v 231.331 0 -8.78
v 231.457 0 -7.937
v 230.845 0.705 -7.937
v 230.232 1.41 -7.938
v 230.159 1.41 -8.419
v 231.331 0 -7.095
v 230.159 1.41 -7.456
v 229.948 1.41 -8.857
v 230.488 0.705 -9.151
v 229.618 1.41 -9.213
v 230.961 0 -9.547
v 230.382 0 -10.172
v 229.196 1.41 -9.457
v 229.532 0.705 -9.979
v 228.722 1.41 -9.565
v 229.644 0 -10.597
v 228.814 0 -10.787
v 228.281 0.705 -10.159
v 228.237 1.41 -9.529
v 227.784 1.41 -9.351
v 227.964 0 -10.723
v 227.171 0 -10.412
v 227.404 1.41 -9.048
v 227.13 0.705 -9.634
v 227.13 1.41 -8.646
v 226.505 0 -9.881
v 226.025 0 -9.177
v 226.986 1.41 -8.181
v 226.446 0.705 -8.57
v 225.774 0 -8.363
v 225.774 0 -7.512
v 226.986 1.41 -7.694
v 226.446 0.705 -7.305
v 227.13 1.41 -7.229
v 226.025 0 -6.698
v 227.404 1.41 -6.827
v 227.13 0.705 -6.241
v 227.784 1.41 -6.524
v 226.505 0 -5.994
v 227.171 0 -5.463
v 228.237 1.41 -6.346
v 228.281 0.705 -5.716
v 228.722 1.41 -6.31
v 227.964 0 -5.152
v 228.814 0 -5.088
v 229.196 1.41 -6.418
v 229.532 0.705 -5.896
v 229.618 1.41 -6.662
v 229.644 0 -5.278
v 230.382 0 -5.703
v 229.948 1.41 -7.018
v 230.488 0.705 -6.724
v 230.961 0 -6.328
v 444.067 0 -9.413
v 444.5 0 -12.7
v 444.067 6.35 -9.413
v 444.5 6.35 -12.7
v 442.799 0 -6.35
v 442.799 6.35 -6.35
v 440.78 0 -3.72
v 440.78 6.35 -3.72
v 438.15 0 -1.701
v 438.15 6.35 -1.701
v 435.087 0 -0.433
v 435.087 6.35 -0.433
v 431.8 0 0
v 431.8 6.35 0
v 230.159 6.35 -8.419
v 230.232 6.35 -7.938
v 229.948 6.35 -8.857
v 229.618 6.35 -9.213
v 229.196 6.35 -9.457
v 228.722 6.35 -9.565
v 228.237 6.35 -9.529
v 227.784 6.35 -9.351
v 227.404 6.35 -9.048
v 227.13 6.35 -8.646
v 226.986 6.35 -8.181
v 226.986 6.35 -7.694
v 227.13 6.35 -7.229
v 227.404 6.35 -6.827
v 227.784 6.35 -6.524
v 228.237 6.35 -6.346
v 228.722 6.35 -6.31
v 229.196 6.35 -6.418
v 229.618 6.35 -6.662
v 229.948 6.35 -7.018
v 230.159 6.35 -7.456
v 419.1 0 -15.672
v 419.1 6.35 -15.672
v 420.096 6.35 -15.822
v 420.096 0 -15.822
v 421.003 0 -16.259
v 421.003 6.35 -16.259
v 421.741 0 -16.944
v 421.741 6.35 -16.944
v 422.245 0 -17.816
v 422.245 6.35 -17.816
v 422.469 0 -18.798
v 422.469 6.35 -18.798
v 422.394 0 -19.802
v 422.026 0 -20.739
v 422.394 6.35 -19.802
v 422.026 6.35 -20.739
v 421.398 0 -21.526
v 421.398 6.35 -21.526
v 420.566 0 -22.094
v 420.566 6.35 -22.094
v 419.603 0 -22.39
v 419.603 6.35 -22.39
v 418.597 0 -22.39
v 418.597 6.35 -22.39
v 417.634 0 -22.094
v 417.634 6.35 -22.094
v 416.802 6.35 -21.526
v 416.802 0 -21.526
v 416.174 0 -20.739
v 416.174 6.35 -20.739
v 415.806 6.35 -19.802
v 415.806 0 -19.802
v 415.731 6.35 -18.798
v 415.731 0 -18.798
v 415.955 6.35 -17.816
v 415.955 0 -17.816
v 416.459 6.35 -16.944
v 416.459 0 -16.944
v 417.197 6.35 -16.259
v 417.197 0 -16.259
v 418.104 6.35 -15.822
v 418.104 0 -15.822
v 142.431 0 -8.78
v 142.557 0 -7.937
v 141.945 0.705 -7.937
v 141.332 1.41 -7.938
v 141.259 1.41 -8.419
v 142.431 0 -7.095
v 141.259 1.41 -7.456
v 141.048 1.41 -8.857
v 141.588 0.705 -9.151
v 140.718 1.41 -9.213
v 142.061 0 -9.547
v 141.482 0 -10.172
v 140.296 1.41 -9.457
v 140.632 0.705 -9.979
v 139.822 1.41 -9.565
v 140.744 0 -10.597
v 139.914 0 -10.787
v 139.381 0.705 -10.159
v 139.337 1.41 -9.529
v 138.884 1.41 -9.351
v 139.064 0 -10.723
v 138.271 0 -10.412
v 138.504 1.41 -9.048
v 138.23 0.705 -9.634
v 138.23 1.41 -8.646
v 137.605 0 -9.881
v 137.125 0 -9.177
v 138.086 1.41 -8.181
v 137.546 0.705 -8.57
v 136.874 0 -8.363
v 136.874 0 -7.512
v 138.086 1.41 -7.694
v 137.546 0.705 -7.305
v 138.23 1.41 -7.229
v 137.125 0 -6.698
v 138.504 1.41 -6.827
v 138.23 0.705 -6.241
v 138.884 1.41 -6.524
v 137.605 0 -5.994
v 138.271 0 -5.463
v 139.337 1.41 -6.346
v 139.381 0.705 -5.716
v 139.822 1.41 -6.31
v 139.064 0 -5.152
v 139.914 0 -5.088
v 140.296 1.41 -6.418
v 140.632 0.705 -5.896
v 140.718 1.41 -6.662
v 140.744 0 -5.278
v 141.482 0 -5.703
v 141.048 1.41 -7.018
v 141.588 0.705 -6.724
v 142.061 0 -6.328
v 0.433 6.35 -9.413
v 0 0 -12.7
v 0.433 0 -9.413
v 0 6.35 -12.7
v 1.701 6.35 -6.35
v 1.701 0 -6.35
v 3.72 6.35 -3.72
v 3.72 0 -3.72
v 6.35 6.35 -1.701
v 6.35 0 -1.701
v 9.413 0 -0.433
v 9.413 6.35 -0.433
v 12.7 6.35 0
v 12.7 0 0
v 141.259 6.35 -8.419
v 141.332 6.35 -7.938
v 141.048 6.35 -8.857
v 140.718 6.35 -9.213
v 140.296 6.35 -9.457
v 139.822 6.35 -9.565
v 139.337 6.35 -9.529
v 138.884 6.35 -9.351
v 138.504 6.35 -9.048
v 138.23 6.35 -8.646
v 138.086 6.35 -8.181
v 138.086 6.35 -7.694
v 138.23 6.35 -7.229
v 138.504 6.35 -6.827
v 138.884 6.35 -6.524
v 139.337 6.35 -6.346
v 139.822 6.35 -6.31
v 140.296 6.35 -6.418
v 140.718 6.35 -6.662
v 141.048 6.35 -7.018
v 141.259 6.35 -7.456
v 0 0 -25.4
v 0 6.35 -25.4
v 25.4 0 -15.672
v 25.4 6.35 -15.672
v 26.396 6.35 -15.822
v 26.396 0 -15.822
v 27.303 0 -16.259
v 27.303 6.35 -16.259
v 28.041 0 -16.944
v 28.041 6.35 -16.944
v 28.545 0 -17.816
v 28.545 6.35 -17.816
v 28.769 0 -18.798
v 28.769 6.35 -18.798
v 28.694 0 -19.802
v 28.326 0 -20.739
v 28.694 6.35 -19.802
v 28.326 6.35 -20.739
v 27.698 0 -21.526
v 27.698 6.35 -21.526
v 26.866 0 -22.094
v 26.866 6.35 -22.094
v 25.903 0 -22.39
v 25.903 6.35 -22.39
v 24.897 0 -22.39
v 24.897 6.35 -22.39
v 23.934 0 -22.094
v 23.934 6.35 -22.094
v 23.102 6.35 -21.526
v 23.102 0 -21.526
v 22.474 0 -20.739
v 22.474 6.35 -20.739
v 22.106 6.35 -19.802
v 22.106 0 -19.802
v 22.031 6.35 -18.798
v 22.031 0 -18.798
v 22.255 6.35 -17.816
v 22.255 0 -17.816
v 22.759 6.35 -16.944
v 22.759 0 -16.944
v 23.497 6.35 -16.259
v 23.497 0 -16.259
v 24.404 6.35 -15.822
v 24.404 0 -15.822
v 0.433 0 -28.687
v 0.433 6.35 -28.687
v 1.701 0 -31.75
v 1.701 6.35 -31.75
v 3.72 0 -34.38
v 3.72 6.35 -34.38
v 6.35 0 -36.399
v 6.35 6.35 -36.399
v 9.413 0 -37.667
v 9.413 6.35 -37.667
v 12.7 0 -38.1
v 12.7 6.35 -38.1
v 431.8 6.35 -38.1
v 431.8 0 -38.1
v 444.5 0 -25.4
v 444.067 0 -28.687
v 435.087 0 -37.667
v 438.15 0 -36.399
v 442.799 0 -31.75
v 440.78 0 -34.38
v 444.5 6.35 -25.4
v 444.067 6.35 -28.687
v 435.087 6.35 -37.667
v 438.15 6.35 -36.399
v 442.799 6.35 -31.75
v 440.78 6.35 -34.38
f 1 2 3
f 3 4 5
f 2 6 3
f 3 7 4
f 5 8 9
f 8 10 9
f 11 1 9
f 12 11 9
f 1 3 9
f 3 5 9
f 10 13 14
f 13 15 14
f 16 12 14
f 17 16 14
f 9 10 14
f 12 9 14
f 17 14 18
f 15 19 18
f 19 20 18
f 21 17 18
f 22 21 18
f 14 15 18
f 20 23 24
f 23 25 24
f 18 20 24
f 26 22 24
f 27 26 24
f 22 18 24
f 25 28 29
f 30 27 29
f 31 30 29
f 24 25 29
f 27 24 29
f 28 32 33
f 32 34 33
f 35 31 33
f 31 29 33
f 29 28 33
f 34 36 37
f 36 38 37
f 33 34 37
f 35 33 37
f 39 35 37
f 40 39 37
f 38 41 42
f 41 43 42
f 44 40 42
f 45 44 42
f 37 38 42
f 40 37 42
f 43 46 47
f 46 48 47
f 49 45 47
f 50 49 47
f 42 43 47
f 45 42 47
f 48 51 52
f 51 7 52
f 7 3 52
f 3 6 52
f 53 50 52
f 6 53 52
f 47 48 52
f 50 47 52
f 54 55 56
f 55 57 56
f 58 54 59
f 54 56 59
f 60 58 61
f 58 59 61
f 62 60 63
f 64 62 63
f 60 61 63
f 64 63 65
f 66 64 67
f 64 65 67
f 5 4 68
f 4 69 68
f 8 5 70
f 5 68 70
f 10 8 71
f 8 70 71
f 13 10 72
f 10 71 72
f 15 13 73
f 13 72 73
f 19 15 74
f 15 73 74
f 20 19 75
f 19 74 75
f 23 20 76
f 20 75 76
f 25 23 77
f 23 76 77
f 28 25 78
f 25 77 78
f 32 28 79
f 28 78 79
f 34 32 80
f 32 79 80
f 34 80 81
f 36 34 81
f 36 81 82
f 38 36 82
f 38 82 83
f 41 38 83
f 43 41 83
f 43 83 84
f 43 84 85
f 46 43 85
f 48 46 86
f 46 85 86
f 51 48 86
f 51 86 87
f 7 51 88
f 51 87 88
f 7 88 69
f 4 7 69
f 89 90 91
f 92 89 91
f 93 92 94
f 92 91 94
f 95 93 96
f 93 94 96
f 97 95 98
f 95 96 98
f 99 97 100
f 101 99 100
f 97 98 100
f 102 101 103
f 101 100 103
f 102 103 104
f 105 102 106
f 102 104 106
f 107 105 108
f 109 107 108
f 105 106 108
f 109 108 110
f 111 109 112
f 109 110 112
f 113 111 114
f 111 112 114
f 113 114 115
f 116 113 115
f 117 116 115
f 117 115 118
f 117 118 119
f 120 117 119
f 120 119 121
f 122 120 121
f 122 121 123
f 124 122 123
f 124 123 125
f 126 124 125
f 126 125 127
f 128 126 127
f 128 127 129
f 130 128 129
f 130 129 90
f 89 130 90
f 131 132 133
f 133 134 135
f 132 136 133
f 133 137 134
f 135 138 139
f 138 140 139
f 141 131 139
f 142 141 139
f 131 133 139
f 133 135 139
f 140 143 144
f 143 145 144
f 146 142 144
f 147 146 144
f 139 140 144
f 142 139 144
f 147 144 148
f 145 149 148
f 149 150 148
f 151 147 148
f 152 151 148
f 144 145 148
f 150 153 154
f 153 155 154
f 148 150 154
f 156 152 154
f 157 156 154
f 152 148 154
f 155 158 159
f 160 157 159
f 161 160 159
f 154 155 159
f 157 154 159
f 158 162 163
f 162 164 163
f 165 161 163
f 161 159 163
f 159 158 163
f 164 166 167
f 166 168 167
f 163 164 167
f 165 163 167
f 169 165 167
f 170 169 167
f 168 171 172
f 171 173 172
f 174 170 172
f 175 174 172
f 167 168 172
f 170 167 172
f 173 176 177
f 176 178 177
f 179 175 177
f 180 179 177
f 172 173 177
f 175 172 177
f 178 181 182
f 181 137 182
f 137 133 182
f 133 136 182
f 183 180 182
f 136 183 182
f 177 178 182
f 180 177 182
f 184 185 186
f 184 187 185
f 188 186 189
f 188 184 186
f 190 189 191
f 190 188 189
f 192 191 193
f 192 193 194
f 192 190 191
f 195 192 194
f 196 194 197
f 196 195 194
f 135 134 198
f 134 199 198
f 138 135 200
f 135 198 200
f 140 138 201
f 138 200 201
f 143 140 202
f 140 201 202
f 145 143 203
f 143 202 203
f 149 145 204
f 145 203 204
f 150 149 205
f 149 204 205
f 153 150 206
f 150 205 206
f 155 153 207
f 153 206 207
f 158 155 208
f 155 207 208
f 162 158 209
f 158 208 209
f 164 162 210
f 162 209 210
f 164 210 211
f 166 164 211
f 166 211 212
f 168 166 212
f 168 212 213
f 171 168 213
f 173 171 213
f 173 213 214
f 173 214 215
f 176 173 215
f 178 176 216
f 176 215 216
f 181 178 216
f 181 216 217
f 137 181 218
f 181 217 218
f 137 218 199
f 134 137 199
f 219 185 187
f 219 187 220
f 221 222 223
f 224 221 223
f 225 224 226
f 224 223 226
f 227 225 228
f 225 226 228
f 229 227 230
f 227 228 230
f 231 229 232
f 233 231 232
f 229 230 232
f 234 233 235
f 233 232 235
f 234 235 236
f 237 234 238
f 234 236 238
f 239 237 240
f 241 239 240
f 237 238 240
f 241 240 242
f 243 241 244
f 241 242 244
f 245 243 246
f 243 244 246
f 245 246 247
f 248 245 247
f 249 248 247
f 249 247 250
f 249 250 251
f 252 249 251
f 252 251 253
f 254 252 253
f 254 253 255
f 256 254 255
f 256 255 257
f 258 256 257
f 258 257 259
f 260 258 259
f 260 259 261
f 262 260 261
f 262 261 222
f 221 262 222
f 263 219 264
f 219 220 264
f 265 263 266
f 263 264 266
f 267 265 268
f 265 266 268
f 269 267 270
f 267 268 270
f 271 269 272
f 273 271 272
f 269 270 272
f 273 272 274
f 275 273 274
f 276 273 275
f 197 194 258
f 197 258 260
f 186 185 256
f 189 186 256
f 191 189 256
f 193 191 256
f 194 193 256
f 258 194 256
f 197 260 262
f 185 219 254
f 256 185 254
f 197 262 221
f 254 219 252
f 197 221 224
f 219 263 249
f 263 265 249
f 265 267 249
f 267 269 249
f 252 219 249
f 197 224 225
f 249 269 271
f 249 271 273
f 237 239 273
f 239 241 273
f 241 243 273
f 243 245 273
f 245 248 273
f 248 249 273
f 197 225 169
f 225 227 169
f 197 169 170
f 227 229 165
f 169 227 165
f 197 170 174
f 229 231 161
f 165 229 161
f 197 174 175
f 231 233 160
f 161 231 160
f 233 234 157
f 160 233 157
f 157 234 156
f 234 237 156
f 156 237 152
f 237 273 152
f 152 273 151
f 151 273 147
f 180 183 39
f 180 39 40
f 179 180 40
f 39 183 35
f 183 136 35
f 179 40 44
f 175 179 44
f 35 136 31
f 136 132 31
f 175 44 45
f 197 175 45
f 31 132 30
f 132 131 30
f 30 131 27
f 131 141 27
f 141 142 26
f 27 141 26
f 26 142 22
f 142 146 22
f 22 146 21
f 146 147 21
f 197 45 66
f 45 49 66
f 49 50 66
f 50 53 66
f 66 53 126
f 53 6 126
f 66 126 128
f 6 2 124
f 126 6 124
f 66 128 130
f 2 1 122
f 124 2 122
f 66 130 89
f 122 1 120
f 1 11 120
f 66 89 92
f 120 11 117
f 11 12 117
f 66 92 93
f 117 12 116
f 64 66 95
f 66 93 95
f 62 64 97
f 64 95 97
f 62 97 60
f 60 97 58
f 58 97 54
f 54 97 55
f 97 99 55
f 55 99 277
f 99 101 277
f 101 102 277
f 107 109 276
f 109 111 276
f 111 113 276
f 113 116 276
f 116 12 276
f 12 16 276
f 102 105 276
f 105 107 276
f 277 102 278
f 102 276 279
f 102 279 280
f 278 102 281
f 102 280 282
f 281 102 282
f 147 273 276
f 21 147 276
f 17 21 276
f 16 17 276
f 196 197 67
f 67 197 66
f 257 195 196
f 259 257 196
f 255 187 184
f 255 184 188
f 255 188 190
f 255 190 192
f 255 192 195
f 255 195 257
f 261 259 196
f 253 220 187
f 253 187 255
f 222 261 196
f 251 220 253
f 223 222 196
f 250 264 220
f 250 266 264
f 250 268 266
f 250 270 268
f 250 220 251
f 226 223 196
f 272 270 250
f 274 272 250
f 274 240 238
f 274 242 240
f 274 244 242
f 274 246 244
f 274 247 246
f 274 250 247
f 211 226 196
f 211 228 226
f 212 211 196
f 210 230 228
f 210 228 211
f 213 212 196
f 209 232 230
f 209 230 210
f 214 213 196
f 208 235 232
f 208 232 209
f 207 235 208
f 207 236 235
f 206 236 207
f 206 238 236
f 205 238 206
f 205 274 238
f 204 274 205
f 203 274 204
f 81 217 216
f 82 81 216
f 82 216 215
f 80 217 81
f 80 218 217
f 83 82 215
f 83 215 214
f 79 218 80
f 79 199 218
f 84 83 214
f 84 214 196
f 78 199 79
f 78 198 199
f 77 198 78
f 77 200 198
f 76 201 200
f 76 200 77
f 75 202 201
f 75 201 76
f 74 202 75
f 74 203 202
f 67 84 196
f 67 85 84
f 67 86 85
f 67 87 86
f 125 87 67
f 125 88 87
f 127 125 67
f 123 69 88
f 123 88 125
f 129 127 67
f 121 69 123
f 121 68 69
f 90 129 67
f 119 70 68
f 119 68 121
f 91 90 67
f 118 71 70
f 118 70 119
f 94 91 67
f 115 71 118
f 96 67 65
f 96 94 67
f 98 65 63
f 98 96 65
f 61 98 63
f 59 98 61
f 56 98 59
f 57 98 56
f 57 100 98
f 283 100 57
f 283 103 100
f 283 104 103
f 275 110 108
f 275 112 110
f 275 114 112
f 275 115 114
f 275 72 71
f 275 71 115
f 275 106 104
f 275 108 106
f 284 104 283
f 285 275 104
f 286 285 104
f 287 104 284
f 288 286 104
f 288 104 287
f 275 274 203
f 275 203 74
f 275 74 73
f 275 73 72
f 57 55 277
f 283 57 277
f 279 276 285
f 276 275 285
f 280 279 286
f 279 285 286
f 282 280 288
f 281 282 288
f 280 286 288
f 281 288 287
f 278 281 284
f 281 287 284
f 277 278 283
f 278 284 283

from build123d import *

# Parameters (mm, degrees)
SKETCH1_W                                      = 444.5
SKETCH1_H                                      = 38.1
BOSS_EXTRUDE1_DEPTH                            = 6.35
FILLET1_R                                      = 12.7
FILLET2_R                                      = 12.7
FILLET3_R                                      = 12.7
FILLET4_R                                      = 12.7
SKETCH2_R                                      = 3.3782
CUT_EXTRUDE1_DEPTH                             = 447.175058133
SKETCH4_R                                      = 3.3782
CUT_EXTRUDE2_DEPTH                             = 447.175058133
CSK_FOR_4_FLAT_HEAD_MACHINE_SCREW1_D           = 3.2639
CSK_FOR_4_FLAT_HEAD_MACHINE_SCREW1_CSINK_D     = 5.715
CSK_FOR_4_FLAT_HEAD_MACHINE_SCREW1_CSINK_ANGLE = 82


with BuildPart() as part:
    # Sketch1 → Boss-Extrude1 (new body)
    with BuildSketch(Plane(origin=(0, 0, 0), x_dir=(1, 0, 0), z_dir=(0, 1, 0))):
        with Locations((222.25, 19.05)):
            Rectangle(SKETCH1_W, SKETCH1_H)
    extrude(amount=BOSS_EXTRUDE1_DEPTH)

    # Fillet1
    fillet1_edges = [part.edges().sort_by_distance(p)[0] for p in [
        (0, 3.175, 0),
    ]]
    fillet(fillet1_edges, radius=FILLET1_R)

    # Fillet2
    fillet2_edges = [part.edges().sort_by_distance(p)[0] for p in [
        (0, 3.175, -38.1),
    ]]
    fillet(fillet2_edges, radius=FILLET2_R)

    # Fillet3
    fillet3_edges = [part.edges().sort_by_distance(p)[0] for p in [
        (444.5, 3.175, -38.1),
    ]]
    fillet(fillet3_edges, radius=FILLET3_R)

    # Fillet4
    fillet4_edges = [part.edges().sort_by_distance(p)[0] for p in [
        (444.5, 3.175, 0),
    ]]
    fillet(fillet4_edges, radius=FILLET4_R)

    # Sketch2 → Cut-Extrude1 (cut, through all)
    with BuildSketch(Plane(origin=(0, 6.35, 0), x_dir=(1, 0, 0), z_dir=(0, 1, 0))):
        with Locations(Location((25.4, 19.05, 0), (0, 0, 270))):
            Circle(SKETCH2_R)
    extrude(amount=-CUT_EXTRUDE1_DEPTH, mode=Mode.SUBTRACT)

    # Sketch4 → Cut-Extrude2 (cut, through all)
    with BuildSketch(Plane(origin=(0, 6.35, 0), x_dir=(1, 0, 0), z_dir=(0, 1, 0))):
        with Locations(Location((419.1, 19.05, 0), (0, 0, 270))):
            Circle(SKETCH4_R)
    extrude(amount=-CUT_EXTRUDE2_DEPTH, mode=Mode.SUBTRACT)

    # CSK for #4 Flat Head Machine Screw1 (through all)
    with Locations(Plane(origin=(0, 0, 0), x_dir=(-1, 0, 0), z_dir=(0, -1, 0))):
        with Locations((-228.6, 7.9375), (-139.7, 7.9375)):
            CounterSinkHole(CSK_FOR_4_FLAT_HEAD_MACHINE_SCREW1_D / 2, CSK_FOR_4_FLAT_HEAD_MACHINE_SCREW1_CSINK_D / 2, counter_sink_angle=CSK_FOR_4_FLAT_HEAD_MACHINE_SCREW1_CSINK_ANGLE)


solid = part.part
